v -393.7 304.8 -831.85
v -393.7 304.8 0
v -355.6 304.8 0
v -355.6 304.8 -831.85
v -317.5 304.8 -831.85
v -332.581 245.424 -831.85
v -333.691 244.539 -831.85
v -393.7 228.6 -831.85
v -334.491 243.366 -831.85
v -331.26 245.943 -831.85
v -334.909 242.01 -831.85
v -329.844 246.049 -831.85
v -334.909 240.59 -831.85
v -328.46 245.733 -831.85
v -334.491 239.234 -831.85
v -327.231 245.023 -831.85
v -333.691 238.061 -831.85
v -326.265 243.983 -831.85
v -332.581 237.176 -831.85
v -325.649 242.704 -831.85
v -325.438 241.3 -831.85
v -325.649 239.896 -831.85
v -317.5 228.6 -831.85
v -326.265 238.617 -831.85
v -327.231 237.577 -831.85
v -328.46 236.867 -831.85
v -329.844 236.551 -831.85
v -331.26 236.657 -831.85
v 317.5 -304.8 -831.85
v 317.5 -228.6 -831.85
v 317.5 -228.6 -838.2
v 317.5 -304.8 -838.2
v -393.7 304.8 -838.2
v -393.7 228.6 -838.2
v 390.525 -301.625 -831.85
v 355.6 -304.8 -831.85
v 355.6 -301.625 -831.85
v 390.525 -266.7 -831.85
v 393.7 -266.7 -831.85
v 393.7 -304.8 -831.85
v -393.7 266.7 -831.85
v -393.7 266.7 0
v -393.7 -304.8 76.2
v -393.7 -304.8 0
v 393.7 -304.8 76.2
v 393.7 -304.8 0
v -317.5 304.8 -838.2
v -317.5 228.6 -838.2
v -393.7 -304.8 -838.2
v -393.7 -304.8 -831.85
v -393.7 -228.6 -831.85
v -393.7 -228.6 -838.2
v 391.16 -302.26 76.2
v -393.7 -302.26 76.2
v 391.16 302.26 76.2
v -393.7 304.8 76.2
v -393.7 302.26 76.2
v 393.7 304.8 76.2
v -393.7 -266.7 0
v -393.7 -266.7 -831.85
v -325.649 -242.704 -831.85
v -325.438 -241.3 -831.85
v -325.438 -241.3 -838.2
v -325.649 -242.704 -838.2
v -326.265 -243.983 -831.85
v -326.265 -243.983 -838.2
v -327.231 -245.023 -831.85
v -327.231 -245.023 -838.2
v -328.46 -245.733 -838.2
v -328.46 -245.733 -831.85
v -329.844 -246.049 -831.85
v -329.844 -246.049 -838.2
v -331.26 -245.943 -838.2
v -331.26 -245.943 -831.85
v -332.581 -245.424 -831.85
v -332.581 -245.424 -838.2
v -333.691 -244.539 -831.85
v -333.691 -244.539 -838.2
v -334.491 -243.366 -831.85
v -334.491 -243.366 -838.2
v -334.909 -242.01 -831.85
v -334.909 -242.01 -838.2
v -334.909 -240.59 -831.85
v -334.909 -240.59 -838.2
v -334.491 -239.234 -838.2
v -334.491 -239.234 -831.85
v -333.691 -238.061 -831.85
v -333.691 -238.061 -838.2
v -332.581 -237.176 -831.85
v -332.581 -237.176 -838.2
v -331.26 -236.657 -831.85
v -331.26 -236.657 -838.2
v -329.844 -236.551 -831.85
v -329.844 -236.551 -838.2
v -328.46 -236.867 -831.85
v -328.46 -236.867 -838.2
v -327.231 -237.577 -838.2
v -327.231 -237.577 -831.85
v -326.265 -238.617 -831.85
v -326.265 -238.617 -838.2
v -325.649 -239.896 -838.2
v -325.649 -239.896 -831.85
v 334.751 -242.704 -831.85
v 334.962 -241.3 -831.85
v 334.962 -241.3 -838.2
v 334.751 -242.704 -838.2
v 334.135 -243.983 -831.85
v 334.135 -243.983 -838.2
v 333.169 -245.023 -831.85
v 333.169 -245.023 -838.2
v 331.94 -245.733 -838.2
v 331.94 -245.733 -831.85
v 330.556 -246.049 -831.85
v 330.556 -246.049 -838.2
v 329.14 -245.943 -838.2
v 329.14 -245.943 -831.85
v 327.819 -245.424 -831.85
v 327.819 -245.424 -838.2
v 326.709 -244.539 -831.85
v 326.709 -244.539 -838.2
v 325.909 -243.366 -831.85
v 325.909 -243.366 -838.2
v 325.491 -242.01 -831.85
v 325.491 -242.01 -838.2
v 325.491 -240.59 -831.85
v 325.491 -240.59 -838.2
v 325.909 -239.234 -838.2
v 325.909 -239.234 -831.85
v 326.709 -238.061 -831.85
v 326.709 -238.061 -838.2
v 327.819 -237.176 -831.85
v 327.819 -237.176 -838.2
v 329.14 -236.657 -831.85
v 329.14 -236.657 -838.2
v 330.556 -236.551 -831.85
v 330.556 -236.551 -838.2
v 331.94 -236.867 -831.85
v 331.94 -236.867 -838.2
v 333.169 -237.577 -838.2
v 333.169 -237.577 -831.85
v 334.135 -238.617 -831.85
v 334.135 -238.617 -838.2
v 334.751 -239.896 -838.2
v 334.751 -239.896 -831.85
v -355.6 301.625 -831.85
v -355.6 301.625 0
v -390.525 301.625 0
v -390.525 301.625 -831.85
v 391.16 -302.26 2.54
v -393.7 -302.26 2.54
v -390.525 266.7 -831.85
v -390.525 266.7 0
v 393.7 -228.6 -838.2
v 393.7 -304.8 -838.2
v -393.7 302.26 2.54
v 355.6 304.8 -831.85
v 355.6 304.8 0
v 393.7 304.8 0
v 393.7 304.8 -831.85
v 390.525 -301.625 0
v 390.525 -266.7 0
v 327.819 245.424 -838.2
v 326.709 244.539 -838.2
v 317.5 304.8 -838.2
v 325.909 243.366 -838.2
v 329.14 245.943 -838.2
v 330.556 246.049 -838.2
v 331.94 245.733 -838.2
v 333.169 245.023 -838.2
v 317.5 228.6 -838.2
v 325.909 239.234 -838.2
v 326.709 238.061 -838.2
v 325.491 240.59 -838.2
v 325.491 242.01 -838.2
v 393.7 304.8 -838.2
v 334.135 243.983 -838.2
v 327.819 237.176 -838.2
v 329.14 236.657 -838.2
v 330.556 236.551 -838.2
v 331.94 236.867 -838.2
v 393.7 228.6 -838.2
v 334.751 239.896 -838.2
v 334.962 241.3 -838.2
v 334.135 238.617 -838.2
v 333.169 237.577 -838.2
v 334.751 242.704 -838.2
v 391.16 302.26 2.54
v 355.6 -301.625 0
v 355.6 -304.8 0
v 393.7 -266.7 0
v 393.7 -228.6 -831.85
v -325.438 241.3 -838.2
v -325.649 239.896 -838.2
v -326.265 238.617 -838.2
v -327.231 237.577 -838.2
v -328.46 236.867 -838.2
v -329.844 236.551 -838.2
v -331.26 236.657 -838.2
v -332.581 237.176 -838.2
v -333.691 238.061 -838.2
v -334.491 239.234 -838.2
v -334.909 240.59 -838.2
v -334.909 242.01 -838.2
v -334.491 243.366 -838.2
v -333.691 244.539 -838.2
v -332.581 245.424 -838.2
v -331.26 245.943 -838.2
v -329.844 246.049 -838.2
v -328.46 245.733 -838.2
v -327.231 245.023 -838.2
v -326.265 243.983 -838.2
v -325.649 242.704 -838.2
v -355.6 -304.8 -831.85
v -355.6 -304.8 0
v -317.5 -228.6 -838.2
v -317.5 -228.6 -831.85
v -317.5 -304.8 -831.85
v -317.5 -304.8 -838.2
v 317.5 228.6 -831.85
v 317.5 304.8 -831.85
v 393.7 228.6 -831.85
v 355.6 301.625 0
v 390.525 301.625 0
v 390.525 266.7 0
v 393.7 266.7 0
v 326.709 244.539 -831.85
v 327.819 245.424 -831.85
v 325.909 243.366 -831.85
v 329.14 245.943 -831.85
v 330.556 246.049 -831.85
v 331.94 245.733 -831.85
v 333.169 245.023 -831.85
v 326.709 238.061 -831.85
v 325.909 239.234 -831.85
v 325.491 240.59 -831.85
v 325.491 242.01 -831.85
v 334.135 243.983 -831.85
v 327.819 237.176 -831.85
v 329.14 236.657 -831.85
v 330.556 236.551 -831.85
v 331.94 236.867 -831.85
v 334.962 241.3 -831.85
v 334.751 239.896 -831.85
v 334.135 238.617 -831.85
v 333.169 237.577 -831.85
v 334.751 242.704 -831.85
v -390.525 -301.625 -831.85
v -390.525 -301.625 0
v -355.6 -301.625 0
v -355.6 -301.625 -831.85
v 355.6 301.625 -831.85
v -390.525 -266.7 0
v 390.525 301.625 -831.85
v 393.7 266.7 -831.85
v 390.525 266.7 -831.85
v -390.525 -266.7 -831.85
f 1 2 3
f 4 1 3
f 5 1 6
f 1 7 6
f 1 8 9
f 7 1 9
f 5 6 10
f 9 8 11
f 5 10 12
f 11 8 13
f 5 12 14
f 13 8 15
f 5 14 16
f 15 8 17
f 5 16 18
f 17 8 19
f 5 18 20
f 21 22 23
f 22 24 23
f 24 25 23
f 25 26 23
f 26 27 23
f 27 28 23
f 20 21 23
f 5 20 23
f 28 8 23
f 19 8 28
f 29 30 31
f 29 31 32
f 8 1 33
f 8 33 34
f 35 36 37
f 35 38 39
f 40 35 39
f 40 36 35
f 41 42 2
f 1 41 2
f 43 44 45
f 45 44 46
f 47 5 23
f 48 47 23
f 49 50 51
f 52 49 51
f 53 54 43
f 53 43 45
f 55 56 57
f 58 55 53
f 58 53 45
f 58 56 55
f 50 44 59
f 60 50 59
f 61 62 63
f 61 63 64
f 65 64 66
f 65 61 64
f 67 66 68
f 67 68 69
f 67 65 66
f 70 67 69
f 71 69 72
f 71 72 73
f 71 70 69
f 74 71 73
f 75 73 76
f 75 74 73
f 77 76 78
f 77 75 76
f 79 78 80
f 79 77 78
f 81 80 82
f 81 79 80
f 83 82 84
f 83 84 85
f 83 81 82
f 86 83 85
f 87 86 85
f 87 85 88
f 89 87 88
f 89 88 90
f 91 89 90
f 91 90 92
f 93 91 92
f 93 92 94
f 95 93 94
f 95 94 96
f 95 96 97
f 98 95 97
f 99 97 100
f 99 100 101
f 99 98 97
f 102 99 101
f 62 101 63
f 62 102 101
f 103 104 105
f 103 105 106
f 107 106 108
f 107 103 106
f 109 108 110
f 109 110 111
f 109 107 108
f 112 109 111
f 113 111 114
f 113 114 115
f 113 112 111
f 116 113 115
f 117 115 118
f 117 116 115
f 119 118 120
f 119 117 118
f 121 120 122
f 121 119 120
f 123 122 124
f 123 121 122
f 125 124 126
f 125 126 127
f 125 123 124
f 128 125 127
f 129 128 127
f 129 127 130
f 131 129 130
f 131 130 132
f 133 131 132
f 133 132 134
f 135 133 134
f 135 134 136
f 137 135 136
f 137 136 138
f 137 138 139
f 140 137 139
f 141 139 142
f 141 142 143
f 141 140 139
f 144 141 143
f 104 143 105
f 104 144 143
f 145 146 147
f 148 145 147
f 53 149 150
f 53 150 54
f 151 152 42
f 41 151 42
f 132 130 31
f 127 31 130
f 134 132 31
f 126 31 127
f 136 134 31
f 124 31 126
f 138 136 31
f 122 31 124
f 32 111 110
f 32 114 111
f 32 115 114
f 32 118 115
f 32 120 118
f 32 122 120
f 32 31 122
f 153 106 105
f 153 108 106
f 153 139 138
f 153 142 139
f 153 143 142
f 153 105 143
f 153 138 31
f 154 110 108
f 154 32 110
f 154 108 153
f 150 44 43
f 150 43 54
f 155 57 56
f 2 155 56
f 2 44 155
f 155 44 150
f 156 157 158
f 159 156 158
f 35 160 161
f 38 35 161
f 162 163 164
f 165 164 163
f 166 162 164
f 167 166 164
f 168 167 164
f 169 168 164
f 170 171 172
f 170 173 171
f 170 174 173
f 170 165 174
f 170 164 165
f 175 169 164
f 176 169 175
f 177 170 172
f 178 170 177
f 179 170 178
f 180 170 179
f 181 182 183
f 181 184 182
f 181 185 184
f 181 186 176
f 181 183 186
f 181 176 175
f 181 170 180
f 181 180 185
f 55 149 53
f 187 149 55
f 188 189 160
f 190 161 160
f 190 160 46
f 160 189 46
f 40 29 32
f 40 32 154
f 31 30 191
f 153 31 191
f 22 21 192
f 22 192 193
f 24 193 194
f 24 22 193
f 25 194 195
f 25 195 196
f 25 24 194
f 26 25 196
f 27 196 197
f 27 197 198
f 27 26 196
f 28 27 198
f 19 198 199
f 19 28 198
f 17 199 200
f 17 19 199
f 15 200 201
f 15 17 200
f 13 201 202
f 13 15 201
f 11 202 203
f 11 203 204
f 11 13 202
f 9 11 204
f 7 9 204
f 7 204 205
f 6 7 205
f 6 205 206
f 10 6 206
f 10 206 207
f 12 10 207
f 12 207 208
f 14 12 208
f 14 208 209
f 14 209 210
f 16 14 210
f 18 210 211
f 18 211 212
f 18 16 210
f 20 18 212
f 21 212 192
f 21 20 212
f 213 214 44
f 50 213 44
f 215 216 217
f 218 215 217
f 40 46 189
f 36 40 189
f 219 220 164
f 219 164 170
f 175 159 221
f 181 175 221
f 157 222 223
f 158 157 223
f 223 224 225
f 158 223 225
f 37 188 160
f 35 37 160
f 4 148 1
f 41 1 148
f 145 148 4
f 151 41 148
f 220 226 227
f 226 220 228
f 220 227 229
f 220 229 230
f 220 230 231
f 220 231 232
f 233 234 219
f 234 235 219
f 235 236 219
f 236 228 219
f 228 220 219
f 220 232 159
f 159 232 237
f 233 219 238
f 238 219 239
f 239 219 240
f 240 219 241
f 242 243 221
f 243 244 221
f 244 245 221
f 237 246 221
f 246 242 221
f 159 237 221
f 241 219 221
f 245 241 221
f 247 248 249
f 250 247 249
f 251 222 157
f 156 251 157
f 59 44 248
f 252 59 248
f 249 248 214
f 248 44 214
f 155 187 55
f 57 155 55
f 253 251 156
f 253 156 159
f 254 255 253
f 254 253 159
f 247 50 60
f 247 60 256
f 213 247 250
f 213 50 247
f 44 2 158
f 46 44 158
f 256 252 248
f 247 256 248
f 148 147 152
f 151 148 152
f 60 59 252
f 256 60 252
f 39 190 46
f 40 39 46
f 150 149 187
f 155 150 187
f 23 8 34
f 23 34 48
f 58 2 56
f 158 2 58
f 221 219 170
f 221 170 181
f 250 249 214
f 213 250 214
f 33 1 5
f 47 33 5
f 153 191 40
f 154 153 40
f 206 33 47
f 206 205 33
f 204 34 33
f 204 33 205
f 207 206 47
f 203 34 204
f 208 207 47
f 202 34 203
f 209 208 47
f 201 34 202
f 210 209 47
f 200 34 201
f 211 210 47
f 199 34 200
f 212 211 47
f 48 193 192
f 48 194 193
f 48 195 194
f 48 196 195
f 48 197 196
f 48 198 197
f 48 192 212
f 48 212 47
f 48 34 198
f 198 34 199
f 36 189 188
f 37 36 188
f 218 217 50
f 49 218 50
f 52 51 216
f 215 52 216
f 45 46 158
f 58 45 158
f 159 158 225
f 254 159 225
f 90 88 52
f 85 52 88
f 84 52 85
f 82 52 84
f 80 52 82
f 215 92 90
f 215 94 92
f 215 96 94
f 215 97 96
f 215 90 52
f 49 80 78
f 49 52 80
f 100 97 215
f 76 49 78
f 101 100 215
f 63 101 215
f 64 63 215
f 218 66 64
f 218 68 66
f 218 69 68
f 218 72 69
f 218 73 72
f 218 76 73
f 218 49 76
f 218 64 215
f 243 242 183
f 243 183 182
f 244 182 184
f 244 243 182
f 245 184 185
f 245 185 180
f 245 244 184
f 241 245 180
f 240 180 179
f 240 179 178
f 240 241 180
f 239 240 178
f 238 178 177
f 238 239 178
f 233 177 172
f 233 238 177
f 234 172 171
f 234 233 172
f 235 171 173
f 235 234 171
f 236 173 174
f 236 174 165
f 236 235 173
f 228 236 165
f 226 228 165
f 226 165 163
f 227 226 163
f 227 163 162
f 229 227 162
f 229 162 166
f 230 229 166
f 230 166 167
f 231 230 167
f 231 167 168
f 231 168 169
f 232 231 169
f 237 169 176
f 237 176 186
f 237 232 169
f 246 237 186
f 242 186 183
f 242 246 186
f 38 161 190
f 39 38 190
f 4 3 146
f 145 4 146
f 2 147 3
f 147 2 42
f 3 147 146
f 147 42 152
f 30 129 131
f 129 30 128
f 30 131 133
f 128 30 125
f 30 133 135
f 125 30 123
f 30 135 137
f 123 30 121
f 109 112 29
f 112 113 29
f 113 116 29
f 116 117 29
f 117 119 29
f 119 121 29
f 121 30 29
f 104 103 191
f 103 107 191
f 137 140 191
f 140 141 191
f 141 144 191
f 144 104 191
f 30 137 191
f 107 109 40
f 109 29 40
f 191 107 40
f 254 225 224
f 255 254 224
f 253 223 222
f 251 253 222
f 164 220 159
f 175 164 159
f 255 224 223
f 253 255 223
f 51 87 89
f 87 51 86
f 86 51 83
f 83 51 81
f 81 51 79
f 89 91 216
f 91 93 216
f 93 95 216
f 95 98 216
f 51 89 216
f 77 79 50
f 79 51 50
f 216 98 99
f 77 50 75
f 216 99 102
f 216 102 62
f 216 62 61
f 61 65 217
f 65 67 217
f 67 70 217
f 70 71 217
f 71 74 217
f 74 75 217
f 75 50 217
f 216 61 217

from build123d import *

# Parameters (mm, degrees)
F0_W     = 787.4
F0_H     = 609.6
F1_DEPTH = 76.2
F2_T     = -2.54
F3_W     = 604.52
F3_H     = 73.66
F4_DEPTH = 25.4
F6_DEPTH = 831.85
F7_R     = 4.7625
F8_DEPTH = 6.35
F7_W     = 76.2
F7_H     = 76.2


with BuildPart() as f1:
    # F0 (on Top) → F1 (new body)
    with BuildSketch(Plane.XY):
        Rectangle(F0_W, F0_H)
    extrude(amount=F1_DEPTH)

    # F2
    f2_openings = [f1.faces().sort_by_distance(p)[0] for p in [
        (0, 0, 76.2),
    ]]
    offset(amount=F2_T, openings=f2_openings)

    # F3 (on face) → F4 (cut)
    with BuildSketch(Plane.YZ.offset(-391.16)):
        with Locations((0, 39.37)):
            Rectangle(F3_W, F3_H)
    extrude(amount=-F4_DEPTH, mode=Mode.SUBTRACT)


with BuildPart() as f6:
    # F5 (on face) → F6 (new body)
    with BuildSketch(Plane(origin=(0, 0, 0), x_dir=(1, 0, 0), z_dir=(0, 0, -1))):
        Polygon((-355.6, 304.8), (-393.7, 304.8), (-393.7, 266.7), (-390.525, 266.7), (-390.525, 301.625), (-355.6, 301.625), align=None)
    extrude(amount=F6_DEPTH)


with BuildPart() as f6b:
    # F5 (on face) → F6, piece 2 (new body)
    with BuildSketch(Plane(origin=(0, 0, 0), x_dir=(1, 0, 0), z_dir=(0, 0, -1))):
        Polygon((-390.525, -266.7), (-393.7, -266.7), (-393.7, -304.8), (-355.6, -304.8), (-355.6, -301.625), (-390.525, -301.625), align=None)
    extrude(amount=F6_DEPTH)


with BuildPart() as f6c:
    # F5 (on face) → F6, piece 3 (new body)
    with BuildSketch(Plane(origin=(0, 0, 0), x_dir=(1, 0, 0), z_dir=(0, 0, -1))):
        Polygon((393.7, -304.8), (393.7, -266.7), (390.525, -266.7), (390.525, -301.625), (355.6, -301.625), (355.6, -304.8), align=None)
    extrude(amount=F6_DEPTH)


with BuildPart() as f6d:
    # F5 (on face) → F6, piece 4 (new body)
    with BuildSketch(Plane(origin=(0, 0, 0), x_dir=(1, 0, 0), z_dir=(0, 0, -1))):
        Polygon((393.7, 304.8), (355.6, 304.8), (355.6, 301.625), (390.525, 301.625), (390.525, 266.7), (393.7, 266.7), align=None)
    extrude(amount=F6_DEPTH)


with BuildPart() as f8:
    # F7 (on face) → F8 (new body)
    with BuildSketch(Plane(origin=(0, 0, -831.85), x_dir=(1, 0, 0), z_dir=(0, 0, -1))):
        Polygon((-317.5, 304.8), (-355.6, 304.8), (-355.6, 301.625), (-390.525, 301.625), (-390.525, 266.7), (-393.7, 266.7), (-393.7, 228.6), (-317.5, 228.6), align=None)
        with Locations((-330.2, 241.3)):
            Circle(F7_R, mode=Mode.SUBTRACT)
        Polygon((-355.6, 304.8), (-393.7, 304.8), (-393.7, 266.7), (-390.525, 266.7), (-390.525, 301.625), (-355.6, 301.625), align=None)
    extrude(amount=F8_DEPTH)


with BuildPart() as f8b:
    # F7 (on face) → F8, piece 2 (new body)
    with BuildSketch(Plane(origin=(0, 0, -831.85), x_dir=(1, 0, 0), z_dir=(0, 0, -1))):
        with Locations((-355.6, -266.7)):
            Rectangle(F7_W, F7_H)
        with Locations((-330.2, -241.3)):
            Circle(F7_R, mode=Mode.SUBTRACT)
    extrude(amount=F8_DEPTH)


with BuildPart() as f8c:
    # F7 (on face) → F8, piece 3 (new body)
    with BuildSketch(Plane(origin=(0, 0, -831.85), x_dir=(1, 0, 0), z_dir=(0, 0, -1))):
        with Locations((355.6, -266.7)):
            Rectangle(F7_W, F7_H)
        with Locations((330.2, -241.3)):
            Circle(F7_R, mode=Mode.SUBTRACT)
    extrude(amount=F8_DEPTH)


with BuildPart() as f8d:
    # F7 (on face) → F8, piece 4 (new body)
    with BuildSketch(Plane(origin=(0, 0, -831.85), x_dir=(1, 0, 0), z_dir=(0, 0, -1))):
        with Locations((355.6, 266.7)):
            Rectangle(F7_W, F7_H)
        with Locations((330.2, 241.3)):
            Circle(F7_R, mode=Mode.SUBTRACT)
    extrude(amount=F8_DEPTH)


solid = Compound([f1.part, f6.part, f6b.part, f6c.part, f6d.part, f8.part, f8b.part, f8c.part, f8d.part])
